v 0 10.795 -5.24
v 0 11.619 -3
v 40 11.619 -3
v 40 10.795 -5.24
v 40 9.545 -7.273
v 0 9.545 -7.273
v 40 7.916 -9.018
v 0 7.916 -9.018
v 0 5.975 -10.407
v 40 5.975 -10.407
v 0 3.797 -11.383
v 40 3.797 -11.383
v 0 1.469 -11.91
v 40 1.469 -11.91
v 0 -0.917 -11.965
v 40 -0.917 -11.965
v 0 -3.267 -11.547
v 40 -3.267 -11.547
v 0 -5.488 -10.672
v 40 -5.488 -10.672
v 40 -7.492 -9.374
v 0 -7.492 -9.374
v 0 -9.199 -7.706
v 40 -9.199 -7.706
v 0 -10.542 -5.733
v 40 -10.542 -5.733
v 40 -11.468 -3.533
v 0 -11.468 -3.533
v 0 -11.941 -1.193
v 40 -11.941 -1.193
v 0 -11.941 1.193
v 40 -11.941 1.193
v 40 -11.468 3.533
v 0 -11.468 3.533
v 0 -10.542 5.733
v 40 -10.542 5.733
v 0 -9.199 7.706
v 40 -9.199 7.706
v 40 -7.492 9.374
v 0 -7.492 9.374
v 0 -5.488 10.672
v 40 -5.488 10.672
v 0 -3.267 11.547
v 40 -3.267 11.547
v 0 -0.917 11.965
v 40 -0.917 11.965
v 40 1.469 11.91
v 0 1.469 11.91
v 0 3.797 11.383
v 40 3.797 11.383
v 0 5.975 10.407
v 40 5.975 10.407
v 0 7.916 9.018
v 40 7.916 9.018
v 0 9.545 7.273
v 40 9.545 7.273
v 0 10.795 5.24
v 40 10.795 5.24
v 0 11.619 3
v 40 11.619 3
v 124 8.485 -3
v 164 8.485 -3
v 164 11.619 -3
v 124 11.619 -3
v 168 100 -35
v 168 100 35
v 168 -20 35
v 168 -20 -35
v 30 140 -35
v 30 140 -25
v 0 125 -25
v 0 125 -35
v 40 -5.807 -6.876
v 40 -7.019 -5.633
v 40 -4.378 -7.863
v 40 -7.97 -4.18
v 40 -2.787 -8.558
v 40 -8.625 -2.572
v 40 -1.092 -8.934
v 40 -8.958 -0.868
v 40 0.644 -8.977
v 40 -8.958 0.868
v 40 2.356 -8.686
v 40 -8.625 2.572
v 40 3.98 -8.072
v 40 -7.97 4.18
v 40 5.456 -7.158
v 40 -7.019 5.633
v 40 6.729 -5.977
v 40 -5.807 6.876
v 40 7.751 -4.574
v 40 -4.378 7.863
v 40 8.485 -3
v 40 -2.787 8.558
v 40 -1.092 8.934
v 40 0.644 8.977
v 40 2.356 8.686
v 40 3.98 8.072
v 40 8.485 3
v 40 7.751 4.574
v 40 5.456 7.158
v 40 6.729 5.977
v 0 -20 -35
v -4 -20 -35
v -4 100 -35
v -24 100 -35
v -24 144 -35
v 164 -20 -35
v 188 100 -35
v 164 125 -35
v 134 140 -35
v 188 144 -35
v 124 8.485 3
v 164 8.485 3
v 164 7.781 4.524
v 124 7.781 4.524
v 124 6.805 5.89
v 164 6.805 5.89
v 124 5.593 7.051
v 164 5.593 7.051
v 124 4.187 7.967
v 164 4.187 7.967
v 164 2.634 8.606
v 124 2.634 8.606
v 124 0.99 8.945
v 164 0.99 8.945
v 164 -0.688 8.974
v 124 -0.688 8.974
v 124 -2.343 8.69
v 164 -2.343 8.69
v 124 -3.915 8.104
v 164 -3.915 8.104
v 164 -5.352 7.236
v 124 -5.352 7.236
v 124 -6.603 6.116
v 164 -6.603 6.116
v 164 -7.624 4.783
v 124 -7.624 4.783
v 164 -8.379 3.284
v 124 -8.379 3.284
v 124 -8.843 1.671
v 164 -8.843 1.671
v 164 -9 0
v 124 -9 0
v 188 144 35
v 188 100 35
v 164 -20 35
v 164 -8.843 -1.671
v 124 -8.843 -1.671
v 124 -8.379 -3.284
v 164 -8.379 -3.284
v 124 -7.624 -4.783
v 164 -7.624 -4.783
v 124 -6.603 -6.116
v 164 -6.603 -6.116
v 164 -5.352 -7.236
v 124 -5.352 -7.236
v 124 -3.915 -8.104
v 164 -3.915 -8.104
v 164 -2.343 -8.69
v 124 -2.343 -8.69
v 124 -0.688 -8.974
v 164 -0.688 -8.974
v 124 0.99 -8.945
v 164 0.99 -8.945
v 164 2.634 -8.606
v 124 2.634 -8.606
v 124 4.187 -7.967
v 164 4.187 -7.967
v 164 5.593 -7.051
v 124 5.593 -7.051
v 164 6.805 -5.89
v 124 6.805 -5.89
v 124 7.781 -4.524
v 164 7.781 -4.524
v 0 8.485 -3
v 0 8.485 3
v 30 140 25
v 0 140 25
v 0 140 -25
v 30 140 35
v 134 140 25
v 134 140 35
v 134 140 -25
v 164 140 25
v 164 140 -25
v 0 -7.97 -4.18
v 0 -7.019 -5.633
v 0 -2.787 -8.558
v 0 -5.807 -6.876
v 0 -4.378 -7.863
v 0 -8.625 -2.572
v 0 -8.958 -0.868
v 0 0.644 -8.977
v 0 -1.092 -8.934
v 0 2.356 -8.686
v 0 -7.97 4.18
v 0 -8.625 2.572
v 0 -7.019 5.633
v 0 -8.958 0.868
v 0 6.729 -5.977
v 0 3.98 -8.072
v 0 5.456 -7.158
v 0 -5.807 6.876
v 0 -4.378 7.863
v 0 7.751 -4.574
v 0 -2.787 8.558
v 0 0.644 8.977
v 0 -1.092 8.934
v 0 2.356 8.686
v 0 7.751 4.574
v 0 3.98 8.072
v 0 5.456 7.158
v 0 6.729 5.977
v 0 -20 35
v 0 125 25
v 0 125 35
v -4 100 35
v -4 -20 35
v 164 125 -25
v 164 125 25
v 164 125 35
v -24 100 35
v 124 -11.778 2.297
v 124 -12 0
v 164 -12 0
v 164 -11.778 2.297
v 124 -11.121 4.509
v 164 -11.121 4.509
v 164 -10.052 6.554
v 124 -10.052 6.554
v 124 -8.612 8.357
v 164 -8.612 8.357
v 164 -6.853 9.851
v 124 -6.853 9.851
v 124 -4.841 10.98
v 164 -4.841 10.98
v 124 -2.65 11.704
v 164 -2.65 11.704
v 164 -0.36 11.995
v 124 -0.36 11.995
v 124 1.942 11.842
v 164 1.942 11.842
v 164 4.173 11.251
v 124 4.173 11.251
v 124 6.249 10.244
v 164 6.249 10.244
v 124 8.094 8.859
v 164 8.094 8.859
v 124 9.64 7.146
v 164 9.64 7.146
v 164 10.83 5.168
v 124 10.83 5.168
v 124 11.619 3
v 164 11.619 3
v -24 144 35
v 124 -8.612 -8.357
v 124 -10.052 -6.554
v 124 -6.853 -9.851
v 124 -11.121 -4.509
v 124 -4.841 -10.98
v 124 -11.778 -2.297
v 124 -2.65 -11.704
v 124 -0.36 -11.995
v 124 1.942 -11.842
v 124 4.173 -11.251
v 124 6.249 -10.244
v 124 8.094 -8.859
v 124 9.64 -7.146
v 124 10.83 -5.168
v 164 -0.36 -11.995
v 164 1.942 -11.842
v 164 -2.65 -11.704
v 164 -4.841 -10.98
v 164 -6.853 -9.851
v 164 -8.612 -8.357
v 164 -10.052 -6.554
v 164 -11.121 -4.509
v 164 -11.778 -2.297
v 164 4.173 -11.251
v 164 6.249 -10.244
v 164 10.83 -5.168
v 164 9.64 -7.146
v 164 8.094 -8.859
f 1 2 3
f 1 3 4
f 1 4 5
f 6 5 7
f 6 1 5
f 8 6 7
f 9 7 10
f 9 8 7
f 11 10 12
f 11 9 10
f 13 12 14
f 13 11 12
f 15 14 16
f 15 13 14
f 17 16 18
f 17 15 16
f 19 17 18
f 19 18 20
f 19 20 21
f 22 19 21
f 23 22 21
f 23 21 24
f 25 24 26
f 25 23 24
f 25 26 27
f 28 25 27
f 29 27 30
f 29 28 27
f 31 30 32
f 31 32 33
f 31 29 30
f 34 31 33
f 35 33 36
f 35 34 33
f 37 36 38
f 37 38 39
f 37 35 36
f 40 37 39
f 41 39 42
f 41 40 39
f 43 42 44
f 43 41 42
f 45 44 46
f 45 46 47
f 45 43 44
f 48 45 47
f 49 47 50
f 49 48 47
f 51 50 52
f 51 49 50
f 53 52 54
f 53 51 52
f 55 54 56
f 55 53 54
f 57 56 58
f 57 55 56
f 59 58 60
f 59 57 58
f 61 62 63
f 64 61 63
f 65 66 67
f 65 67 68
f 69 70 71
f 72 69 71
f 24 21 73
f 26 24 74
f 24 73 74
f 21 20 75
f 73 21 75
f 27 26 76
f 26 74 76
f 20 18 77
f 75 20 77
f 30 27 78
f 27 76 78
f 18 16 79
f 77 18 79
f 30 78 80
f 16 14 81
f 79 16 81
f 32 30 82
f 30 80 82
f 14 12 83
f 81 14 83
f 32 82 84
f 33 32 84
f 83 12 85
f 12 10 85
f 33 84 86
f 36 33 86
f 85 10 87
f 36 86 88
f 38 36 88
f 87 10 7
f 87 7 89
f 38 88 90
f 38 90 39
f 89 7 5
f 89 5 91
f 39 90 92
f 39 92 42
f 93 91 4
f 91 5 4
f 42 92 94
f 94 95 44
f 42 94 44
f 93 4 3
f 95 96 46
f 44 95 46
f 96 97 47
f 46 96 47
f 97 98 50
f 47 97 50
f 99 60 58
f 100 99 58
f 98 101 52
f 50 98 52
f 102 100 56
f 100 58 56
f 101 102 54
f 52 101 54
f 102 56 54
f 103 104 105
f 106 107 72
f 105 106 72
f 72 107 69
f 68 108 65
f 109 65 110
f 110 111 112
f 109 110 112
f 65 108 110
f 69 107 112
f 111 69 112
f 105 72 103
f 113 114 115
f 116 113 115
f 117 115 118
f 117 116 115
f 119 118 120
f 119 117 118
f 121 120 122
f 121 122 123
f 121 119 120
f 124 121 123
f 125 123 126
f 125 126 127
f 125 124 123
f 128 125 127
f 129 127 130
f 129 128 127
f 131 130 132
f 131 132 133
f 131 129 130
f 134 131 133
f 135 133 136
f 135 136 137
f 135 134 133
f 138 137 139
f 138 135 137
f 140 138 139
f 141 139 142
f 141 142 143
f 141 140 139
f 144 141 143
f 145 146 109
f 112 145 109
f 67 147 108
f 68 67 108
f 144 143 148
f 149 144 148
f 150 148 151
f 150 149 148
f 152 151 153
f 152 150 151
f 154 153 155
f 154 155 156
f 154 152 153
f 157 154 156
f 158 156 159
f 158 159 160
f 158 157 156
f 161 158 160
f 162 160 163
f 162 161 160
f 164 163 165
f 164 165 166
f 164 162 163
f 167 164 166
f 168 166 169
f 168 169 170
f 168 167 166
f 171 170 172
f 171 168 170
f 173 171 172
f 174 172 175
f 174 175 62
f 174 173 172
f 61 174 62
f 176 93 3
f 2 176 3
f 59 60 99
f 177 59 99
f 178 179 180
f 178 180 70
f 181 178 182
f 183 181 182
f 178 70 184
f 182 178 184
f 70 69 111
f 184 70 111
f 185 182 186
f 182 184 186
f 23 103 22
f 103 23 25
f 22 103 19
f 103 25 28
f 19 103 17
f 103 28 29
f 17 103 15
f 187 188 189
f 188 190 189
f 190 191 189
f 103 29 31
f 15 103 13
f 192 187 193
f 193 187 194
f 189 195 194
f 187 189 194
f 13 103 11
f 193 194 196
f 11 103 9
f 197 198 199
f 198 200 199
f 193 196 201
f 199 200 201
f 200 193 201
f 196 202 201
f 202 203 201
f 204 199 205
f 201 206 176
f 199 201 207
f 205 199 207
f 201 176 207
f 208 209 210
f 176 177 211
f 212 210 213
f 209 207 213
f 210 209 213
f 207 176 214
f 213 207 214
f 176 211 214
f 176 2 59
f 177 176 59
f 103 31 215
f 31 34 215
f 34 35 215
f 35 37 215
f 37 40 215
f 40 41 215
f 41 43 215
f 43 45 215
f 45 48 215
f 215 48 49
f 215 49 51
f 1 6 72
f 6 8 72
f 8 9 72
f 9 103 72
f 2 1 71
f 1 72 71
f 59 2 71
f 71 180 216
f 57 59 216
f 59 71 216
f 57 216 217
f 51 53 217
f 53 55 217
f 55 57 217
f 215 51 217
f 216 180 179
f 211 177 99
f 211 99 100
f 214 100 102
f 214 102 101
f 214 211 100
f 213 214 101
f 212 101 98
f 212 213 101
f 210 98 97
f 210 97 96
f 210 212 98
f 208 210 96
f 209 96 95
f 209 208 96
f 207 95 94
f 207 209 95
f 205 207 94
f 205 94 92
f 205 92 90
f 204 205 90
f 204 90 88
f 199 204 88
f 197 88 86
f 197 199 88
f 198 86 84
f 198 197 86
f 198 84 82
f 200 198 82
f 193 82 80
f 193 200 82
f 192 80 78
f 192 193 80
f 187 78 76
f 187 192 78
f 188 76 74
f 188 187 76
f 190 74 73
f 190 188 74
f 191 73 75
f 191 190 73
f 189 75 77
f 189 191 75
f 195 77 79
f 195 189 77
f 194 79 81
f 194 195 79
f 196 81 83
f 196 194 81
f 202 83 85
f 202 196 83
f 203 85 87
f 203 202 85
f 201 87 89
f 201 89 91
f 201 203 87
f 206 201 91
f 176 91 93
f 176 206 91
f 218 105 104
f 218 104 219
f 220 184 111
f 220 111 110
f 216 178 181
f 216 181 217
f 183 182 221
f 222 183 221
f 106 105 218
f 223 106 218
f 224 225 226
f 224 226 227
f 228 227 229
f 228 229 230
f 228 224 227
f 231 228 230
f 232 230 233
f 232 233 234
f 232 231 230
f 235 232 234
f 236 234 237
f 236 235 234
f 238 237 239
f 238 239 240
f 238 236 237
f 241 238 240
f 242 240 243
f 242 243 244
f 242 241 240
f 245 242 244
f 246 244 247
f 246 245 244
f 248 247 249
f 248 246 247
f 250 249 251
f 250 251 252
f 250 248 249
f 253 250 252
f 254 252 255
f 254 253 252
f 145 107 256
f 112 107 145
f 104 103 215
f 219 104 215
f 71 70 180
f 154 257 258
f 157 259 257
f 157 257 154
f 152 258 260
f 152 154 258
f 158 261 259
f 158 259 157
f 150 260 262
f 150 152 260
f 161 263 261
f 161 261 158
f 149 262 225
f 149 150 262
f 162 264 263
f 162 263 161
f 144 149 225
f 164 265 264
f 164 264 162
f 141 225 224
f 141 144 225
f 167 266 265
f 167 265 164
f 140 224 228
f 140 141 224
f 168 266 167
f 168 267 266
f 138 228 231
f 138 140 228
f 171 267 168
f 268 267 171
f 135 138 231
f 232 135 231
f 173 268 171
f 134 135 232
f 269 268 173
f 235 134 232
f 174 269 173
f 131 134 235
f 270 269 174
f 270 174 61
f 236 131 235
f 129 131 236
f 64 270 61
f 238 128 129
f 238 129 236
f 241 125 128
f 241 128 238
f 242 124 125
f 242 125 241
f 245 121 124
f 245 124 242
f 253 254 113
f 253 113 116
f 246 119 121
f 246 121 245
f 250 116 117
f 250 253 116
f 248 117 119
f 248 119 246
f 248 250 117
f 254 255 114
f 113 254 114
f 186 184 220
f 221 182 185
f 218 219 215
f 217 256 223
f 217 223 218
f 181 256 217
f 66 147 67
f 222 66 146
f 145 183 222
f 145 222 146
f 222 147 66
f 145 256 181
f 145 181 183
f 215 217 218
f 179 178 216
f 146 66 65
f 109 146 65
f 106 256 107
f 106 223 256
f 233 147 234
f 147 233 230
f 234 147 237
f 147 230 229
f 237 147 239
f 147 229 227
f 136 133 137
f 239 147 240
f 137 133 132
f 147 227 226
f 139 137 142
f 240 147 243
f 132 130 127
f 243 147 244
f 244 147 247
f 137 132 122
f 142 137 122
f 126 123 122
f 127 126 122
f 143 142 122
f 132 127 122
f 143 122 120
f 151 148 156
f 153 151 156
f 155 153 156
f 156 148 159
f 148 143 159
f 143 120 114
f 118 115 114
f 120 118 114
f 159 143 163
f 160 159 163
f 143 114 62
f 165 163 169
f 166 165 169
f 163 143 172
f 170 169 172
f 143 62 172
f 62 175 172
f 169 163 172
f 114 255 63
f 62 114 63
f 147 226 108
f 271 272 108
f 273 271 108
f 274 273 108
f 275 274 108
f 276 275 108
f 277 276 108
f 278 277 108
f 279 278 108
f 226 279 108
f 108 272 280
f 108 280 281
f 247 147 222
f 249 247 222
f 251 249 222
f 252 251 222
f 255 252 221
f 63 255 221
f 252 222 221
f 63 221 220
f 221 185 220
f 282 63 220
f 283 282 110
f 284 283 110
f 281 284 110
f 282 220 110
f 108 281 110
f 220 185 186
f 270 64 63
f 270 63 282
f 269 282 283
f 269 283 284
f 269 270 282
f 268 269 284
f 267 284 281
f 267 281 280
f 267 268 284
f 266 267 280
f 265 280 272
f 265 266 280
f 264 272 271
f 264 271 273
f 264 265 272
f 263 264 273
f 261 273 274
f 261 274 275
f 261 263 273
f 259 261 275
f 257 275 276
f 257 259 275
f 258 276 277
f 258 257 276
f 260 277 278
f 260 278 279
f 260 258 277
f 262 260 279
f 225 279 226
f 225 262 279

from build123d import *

# Parameters (mm, degrees)
SALIENTE_EXTRUIR1_DEPTH  = 40
SALIENTE_EXTRUIR2_DEPTH  = 4
CROQUIS3_W               = 70
CROQUIS3_H               = 40
SALIENTE_EXTRUIR3_DEPTH  = 20
SALIENTE_EXTRUIR4_START  = 140
CROQUIS5_W               = 164
CROQUIS5_H               = 70
SALIENTE_EXTRUIR4_DEPTH  = 4
SALIENTE_EXTRUIR5_START  = 164
CROQUIS7_W               = 70
CROQUIS7_H               = 160
SALIENTE_EXTRUIR5_DEPTH  = 4
CROQUIS8_W               = 70
CROQUIS8_H               = 40
SALIENTE_EXTRUIR6_DEPTH  = 20
SALIENTE_EXTRUIR12_DEPTH = 4
CROQUIS11_W              = 24
CROQUIS11_H              = 70
SALIENTE_EXTRUIR13_DEPTH = 4
SALIENTE_EXTRUIR14_START = 40
SALIENTE_EXTRUIR14_DEPTH = 40
SALIENTE_EXTRUIR15_START = 25
SALIENTE_EXTRUIR15_DEPTH = 10
SALIENTE_EXTRUIR16_START = -25
SALIENTE_EXTRUIR16_DEPTH = 10


with BuildPart() as part:
    # Croquis1 → Saliente-Extruir1 (new body)
    with BuildSketch(Plane(origin=(0, 0, 0), x_dir=(0, 0, -1), z_dir=(1, 0, 0))):
        with BuildLine():
            Line((-3, 11.618950039), (-3, 8.485281374))
            ThreePointArc((-3, 8.485281374), (0, -9), (3, 8.485281374))
            Line((3, 8.485281374), (3, 11.618950039))
            ThreePointArc((3, 11.618950039), (0, -12), (-3, 11.618950039))
        make_face()
    extrude(amount=SALIENTE_EXTRUIR1_DEPTH)

    # Croquis2 → Saliente-Extruir2 (add)
    with BuildSketch(Plane.ZY):
        Polygon((-35, 0), (-35, -20), (35, -20), (35, 0), (35, 140), (-35, 140), align=None)
    extrude(amount=SALIENTE_EXTRUIR2_DEPTH)

    # Croquis3 → Saliente-Extruir3 (add)
    with BuildSketch(Plane.ZY.offset(4)):
        with Locations((0, 120)):
            Rectangle(CROQUIS3_W, CROQUIS3_H)
    extrude(amount=SALIENTE_EXTRUIR3_DEPTH)



with BuildPart() as body_2:
    # Croquis5 → Saliente-Extruir4 (new body)
    with BuildSketch(Plane(origin=(0, 0, 0), x_dir=(1, 0, 0), z_dir=(0, 1, 0)).offset(SALIENTE_EXTRUIR4_START)):
        with Locations((82, 0)):
            Rectangle(CROQUIS5_W, CROQUIS5_H)
    extrude(amount=SALIENTE_EXTRUIR4_DEPTH)



with BuildPart() as body_3:
    # Croquis7 → Saliente-Extruir5 (new body)
    with BuildSketch(Plane(origin=(0, 0, 0), x_dir=(0, 0, -1), z_dir=(1, 0, 0)).offset(SALIENTE_EXTRUIR5_START)):
        with Locations((0, 60)):
            Rectangle(CROQUIS7_W, CROQUIS7_H)
    extrude(amount=SALIENTE_EXTRUIR5_DEPTH)

    # Croquis8 → Saliente-Extruir6 (add)
    with BuildSketch(Plane(origin=(168, 0, 0), x_dir=(0, 0, -1), z_dir=(1, 0, 0))):
        with Locations((0, 120)):
            Rectangle(CROQUIS8_W, CROQUIS8_H)
    extrude(amount=SALIENTE_EXTRUIR6_DEPTH)


with BuildPart() as body_2_1:
    add(body_2.part)

    add(body_3.part)  # Saliente-Extruir12 merges body 3
    # Croquis10 → Saliente-Extruir12 (add)
    with BuildSketch(Plane(origin=(0, 140, 0), x_dir=(1, 0, 0), z_dir=(0, 1, 0))):
        Polygon((188, 25), (188, -25), (188, -35), (164, -35), (164, -25), (164, 25), (164, 35), (188, 35), align=None)
    extrude(amount=SALIENTE_EXTRUIR12_DEPTH)


with BuildPart() as part_1:
    add(part.part)

    add(body_2_1.part)  # Saliente-Extruir13 merges body 2
    # Croquis11 → Saliente-Extruir13 (add)
    with BuildSketch(Plane(origin=(0, 140, 0), x_dir=(1, 0, 0), z_dir=(0, 1, 0))):
        with Locations((-12, 0)):
            Rectangle(CROQUIS11_W, CROQUIS11_H)
    extrude(amount=SALIENTE_EXTRUIR13_DEPTH)

    # Croquis12 → Saliente-Extruir14 (add)
    with BuildSketch(Plane.ZY.offset(-164).offset(SALIENTE_EXTRUIR14_START)):
        with BuildLine():
            Line((0, -9), (0, -12))
            ThreePointArc((0, -12), (11.904356355, -1.51205151), (3, 11.618950039))
            Line((3, 11.618950039), (3, 8.485281374))
            ThreePointArc((3, 8.485281374), (8.870387037, -1.521917809), (0, -9))
        make_face()
        with BuildLine():
            ThreePointArc((-3, 11.618950039), (-11.904356355, -1.51205151), (0, -12))
            Line((0, -12), (0, -9))
            ThreePointArc((0, -9), (-8.870387037, -1.521917809), (-3, 8.485281374))
            Line((-3, 8.485281374), (-3, 11.618950039))
        make_face()
    extrude(amount=-SALIENTE_EXTRUIR14_DEPTH)

    # Croquis13 → Saliente-Extruir15 (add)
    with BuildSketch(Plane.XY.offset(SALIENTE_EXTRUIR15_START)):
        Polygon((164, 140), (134, 140), (164, 125), align=None)
        Polygon((0, 140), (30, 140), (0, 125), align=None)
    extrude(amount=SALIENTE_EXTRUIR15_DEPTH)

    # Croquis14 → Saliente-Extruir16 (add)
    with BuildSketch(Plane.XY.offset(SALIENTE_EXTRUIR16_START)):
        Polygon((164, 140), (134, 140), (164, 125), align=None)
        Polygon((0, 140), (30, 140), (0, 125), align=None)
    extrude(amount=-SALIENTE_EXTRUIR16_DEPTH)


solid = part_1.part
